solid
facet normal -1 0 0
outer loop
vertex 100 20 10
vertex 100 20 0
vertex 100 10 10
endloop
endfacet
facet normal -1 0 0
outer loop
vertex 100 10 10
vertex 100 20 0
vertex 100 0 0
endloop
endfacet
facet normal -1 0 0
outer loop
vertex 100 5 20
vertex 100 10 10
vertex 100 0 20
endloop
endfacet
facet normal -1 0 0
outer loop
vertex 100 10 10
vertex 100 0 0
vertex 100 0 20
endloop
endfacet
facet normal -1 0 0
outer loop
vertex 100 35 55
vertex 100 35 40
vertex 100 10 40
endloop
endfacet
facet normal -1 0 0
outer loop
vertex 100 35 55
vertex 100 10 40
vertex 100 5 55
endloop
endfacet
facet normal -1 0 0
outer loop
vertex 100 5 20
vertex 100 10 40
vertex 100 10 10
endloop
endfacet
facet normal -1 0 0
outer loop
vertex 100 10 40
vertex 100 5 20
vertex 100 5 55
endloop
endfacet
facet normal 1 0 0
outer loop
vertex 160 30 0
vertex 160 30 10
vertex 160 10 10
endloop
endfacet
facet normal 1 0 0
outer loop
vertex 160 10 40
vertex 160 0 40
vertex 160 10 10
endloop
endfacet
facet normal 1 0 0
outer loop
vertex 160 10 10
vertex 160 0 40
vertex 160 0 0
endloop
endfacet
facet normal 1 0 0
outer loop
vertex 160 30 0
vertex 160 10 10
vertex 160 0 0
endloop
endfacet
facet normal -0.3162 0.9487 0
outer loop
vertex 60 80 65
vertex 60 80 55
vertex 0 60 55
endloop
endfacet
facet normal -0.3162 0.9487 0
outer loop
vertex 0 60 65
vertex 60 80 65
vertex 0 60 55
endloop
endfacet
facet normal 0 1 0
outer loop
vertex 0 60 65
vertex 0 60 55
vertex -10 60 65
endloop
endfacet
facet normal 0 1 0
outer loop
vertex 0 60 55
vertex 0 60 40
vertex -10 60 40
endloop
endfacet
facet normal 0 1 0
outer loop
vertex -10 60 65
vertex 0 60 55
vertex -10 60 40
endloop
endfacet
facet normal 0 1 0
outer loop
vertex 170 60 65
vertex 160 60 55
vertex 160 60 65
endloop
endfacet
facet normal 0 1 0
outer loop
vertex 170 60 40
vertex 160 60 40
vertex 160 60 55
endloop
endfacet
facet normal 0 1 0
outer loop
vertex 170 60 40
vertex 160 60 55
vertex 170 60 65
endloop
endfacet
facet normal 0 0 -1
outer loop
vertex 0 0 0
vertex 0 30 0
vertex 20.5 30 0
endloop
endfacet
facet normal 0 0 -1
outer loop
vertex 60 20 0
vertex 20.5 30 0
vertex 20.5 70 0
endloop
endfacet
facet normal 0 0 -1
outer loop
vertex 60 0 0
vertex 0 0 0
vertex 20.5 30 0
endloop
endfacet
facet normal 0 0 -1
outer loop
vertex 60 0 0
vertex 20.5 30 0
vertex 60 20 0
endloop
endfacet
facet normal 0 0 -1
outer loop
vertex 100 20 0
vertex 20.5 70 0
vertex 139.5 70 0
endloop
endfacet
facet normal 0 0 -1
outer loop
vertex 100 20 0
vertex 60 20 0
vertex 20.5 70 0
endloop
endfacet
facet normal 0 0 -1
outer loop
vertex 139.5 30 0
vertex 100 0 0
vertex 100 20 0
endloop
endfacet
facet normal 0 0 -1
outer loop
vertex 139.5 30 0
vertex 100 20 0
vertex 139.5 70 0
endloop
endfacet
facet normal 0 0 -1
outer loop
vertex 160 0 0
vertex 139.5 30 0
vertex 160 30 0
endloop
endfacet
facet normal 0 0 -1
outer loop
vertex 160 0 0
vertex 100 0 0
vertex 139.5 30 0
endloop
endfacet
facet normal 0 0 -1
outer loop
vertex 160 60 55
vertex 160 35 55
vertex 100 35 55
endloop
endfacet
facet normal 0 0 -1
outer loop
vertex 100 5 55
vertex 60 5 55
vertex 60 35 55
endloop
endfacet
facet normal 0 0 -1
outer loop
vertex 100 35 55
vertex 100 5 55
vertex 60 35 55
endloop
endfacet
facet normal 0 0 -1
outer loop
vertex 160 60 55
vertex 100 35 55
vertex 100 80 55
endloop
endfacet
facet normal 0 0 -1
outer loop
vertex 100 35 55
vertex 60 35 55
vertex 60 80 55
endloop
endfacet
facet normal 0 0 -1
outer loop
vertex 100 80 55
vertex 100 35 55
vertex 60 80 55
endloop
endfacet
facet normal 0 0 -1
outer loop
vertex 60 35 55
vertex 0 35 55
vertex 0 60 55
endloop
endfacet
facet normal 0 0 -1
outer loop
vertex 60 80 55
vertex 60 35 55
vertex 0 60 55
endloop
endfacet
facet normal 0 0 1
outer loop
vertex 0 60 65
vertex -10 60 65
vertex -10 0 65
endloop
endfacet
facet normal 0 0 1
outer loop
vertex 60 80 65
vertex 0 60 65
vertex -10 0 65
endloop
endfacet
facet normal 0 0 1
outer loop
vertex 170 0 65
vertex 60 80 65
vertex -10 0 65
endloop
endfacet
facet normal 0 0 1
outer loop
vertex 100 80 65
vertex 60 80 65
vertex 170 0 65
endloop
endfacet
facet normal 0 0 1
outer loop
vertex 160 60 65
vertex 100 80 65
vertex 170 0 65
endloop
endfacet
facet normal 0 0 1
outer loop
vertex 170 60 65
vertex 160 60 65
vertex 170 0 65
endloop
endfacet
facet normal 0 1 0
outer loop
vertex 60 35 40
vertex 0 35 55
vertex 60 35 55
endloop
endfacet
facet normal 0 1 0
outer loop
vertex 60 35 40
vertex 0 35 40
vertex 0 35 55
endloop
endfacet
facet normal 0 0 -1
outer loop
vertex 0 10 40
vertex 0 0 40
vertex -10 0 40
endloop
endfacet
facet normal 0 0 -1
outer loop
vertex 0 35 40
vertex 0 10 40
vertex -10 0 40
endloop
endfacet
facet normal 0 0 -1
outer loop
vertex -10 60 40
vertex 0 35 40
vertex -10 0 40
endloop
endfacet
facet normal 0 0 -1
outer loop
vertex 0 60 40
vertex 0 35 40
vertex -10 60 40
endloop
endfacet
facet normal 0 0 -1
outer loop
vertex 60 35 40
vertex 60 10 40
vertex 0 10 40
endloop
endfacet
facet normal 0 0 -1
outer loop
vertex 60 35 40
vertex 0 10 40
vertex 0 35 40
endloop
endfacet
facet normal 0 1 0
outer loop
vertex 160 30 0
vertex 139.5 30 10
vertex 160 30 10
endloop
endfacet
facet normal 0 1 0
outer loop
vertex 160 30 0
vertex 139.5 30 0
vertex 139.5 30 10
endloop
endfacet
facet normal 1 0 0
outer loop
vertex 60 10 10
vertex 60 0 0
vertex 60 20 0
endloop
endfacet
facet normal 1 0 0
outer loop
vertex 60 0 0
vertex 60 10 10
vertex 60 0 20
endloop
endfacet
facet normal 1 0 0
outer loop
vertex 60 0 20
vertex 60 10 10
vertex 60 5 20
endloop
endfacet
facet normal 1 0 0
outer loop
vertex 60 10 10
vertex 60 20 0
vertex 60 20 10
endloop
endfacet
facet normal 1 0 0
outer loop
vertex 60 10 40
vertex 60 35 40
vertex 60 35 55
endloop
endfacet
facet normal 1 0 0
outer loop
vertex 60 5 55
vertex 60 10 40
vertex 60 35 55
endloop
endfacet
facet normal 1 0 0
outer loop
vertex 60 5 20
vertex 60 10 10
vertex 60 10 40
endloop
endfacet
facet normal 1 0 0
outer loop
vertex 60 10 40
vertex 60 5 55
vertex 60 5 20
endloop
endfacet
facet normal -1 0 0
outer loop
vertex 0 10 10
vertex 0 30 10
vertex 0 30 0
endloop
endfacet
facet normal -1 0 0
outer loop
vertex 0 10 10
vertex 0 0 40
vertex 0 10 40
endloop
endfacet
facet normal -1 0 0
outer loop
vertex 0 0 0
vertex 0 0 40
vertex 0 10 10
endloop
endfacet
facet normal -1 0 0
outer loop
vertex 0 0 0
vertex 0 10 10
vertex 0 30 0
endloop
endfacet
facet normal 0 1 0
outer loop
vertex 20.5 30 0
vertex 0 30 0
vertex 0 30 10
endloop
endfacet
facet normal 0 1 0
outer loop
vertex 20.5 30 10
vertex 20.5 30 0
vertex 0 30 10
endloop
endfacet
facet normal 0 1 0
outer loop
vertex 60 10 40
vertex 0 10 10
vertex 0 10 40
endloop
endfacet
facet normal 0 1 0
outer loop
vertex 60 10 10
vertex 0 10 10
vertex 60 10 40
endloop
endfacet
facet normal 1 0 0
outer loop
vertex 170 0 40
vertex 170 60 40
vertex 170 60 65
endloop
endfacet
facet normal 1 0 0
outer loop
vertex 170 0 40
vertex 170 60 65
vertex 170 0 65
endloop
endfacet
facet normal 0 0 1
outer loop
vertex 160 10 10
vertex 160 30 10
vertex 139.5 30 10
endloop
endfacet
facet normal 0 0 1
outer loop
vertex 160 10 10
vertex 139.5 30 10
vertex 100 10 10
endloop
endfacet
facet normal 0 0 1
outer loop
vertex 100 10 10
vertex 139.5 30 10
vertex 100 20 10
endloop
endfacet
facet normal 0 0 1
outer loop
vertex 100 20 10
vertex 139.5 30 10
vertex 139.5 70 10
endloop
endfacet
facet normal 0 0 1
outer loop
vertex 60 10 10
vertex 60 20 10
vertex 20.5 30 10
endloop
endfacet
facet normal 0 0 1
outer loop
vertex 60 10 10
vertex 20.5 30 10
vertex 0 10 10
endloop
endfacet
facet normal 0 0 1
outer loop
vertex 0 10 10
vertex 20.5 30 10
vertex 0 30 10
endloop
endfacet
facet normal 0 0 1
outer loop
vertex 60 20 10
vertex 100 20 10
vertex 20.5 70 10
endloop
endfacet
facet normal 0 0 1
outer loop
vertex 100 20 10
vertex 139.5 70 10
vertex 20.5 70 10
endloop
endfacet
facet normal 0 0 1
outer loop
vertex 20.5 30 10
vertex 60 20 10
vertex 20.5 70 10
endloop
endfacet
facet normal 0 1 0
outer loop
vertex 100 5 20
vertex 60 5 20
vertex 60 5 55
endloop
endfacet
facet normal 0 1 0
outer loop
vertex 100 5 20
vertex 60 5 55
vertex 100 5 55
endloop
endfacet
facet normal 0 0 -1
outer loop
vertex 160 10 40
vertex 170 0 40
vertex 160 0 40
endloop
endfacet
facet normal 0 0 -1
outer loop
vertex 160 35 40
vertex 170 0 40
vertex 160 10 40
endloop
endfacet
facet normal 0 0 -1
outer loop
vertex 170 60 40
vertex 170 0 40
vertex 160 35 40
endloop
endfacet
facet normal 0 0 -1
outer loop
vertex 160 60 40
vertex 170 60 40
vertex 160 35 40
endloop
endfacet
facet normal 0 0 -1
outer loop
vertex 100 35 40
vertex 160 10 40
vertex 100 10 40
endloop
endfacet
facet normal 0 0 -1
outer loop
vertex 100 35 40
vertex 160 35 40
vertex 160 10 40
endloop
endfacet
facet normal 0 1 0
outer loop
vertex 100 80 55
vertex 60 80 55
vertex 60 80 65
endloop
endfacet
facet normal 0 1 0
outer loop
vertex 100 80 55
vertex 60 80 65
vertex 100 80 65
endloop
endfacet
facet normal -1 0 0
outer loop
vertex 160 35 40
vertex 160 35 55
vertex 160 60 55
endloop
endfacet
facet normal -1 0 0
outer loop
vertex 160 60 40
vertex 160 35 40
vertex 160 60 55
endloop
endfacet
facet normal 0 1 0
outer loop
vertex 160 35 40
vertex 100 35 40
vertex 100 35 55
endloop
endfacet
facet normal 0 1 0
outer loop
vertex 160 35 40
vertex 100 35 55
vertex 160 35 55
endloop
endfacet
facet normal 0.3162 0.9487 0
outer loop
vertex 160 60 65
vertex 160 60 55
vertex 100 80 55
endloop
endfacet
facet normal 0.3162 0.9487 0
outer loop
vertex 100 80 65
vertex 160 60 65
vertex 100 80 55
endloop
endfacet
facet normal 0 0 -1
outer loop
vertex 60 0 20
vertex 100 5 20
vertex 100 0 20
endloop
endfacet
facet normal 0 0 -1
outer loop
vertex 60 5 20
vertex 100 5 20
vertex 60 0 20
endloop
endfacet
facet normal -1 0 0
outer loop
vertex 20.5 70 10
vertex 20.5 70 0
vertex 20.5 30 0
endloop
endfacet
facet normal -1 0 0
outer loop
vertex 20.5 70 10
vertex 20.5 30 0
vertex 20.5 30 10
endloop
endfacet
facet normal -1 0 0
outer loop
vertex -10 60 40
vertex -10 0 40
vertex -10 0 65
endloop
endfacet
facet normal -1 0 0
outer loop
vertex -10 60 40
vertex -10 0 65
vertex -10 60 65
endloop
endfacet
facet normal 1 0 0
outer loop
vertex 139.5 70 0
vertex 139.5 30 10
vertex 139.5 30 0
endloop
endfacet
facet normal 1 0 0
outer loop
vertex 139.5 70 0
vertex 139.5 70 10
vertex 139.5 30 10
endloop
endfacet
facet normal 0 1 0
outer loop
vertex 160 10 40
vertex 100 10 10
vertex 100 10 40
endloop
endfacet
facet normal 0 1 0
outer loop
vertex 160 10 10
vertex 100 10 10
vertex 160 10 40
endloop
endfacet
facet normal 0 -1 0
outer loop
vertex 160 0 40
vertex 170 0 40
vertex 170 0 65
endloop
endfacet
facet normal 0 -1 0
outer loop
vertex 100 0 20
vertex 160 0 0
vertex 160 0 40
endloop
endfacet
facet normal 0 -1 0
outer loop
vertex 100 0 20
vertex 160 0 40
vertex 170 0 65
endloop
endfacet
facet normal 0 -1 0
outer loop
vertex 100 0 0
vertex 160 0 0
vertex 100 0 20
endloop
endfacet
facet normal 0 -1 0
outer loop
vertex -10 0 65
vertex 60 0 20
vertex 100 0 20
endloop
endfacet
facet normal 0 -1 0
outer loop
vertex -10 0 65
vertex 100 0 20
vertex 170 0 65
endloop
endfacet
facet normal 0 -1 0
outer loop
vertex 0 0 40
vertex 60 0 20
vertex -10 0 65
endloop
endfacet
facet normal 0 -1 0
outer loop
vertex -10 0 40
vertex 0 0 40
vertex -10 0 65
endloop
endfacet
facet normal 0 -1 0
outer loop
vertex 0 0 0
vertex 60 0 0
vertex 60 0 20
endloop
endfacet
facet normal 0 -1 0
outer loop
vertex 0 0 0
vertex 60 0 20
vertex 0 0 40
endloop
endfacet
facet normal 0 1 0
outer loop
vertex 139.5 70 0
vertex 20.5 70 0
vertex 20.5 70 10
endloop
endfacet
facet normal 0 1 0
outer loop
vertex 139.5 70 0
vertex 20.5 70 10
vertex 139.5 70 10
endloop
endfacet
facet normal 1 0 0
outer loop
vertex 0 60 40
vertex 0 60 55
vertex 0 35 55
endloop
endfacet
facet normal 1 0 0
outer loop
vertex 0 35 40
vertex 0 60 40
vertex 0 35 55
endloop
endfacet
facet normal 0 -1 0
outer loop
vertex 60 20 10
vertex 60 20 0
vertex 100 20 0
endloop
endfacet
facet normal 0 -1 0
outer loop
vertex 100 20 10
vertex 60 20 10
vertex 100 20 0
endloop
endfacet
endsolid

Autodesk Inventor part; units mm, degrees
ref_plane "YZ Plane" through (0, 0, 0) normal (1, 0, 0) x (0, 1, 0)
ref_plane "XZ Plane" through (0, 0, 0) normal (0, 1, 0) x (-1, 0, 0)
ref_plane "XY Plane" through (0, 0, 0) normal (0, 0, 1) x (1, 0, 0)
sketch "Sketch1" plane through (0, 0, 0) normal (0, 1, 0) x (-1, 0, 0)
  line L0 (0, 0) -> (-160, 0)
  line L1 (-160, 0) -> (-160, 60)
  line L2 (-160, 60) -> (0, 60)
  line L3 (0, 60) -> (0, 0)
  dimension "d0" = 160
  dimension "d1" = 60
extrude "Extrusion1" add sketch "Sketch1" along normal blind 80
sketch "Sketch2" plane through (0, 80, 0) normal (0, 1, 0) x (1, 0, 0)
  line L0 (160, 0) -> (0, 0) projected
  line L1 (160, 0) -> (150, 0)
  line L2 (150, 0) -> (150, -10)
  line L3 (150, -10) -> (160, -10)
  line L4 (160, -10) -> (160, 0)
  line L5 (160, -10) -> (0, -10)
  line L6 (0, -10) -> (0, -40)
  line L7 (0, -40) -> (160, -40)
  line L8 (160, -40) -> (160, -10)
  dimension "d4" = 10
  dimension "d5" = 10
  dimension "d6" = 160
  dimension "d7" = 30
extrude "Extrusion2" cut sketch "Sketch2" against normal blind 70 contours L8 L7 L6 L5 L3
sketch "Sketch3" plane through (0, 80, 0) normal (0, 1, 0) x (1, 0, 0)
  line L0 (160, -40) -> (0, -40) projected
  line L1 (0, -40) -> (160, -40)
  line L2 (160, -40) -> (160, -50)
  line L3 (160, -50) -> (0, -50)
  line L4 (0, -50) -> (0, -40)
  point P0 (0, 0)
  dimension "d10" = 160
  dimension "d11" = 10
extrude "Extrusion3" cut sketch "Sketch3" against normal blind 10
sketch "Sketch4" plane through (160, 10, 40) normal (0, 0, -1) x (-1, 0, 0)
  line L0 (0, 0) -> (160, 0) projected
  arc A0 (160, 0) -> (0, 0) centre (80, -23.3333) ccw
  line L1 (0, 0) -> (0, 60) projected
  line L2 (0, 0) -> (0, 60)
  line L3 (0, 60) -> (80, 60)
  line L4 (160, 60) -> (0, 60) projected
  line L5 (160, 60) -> (160, 0) projected
  line L6 (160, 0) -> (160, 60)
  line L7 (160, 60) -> (80, 60)
  point P0 (160, -10)
extrude "Extrusion4" cut sketch "Sketch4" against normal blind 10 contours L1 L3 A0 | A0 L4 L5
sketch "Sketch5" plane through (160, 0, 0) normal (0, 0, -1) x (-1, 0, 0)
  line L0 (0, 80) -> (160, 80) projected
  line L1 (0, 80) -> (20, 80)
  line L2 (20, 80) -> (20, 30)
  line L3 (20, 30) -> (0, 30)
  line L4 (0, 30) -> (0, 80)
  line L5 (160, 10) -> (160, 80) projected
  line L6 (160, 80) -> (140, 80)
  line L7 (140, 80) -> (140, 30)
  line L8 (140, 30) -> (160, 30)
  line L9 (160, 30) -> (160, 80)
  point P0 (160, 0)
  dimension "d16" = 20
  dimension "d17" = 50
  dimension "d18" = 20
  dimension "d19" = 50
extrude "Extrusion5" cut sketch "Sketch5" against normal blind 10
sketch "Sketch6" plane through (0, 80, 0) normal (0, 1, 0) x (1, 0, 0)
  line L0 (20, 0) -> (20, -10) projected
  line L1 (20, -10) -> (140, -10)
  line L2 (140, -10) -> (140, 0)
  line L3 (140, 0) -> (20, 0)
  line L4 (20, 0) -> (20, -10)
  point P0 (0, 0)
  dimension "d22" = 120
  dimension "d23" = 10
extrude "Extrusion6" cut sketch "Sketch6" against normal blind 10
sketch "Sketch7" plane through (160, 80, 50) normal (0, 0, -1) x (-1, 0, 0)
  line L0 (0, 0) -> (0, -20)
  line L1 (0, -70) -> (0, 0) projected
  line L2 (0, -20) -> (0, 0)
  line L3 (160, 0) -> (0, 0) projected
  line L4 (0, 0) -> (60, 0)
  line L5 (60, 0) -> (0, -20)
  line L6 (0, 0) -> (160, 0) projected
  line L7 (160, 0) -> (160, -20)
  line L8 (160, 0) -> (160, -70) projected
  line L9 (160, 0) -> (100, 0)
  line L10 (100, 0) -> (160, -20)
  point P0 (160, -80)
  dimension "d26" = 20
  dimension "d27" = 60
  dimension "d28" = 20
  dimension "d29" = 60
extrude "Extrusion7" cut sketch "Sketch7" against normal blind 10
sketch "Sketch8" plane through (140, 30, 10) normal (1, 0, 0) x (0, 0, -1)
  line L0 (10, 40) -> (0, 40) projected
  line L1 (10, 0) -> (10, 40) projected
  line L2 (0, 40) -> (10, 40)
  line L3 (10, 40) -> (10, 0)
  line L4 (10, 0) -> (0, 0)
  line L5 (0, 0) -> (0, 40)
  point P0 (10, -30)
extrude "Extrusion8" cut sketch "Sketch8" against normal blind 0.5
sketch "Sketch9" plane through (20, 30, 0) normal (-1, 0, 0) x (0, 0, 1)
  line L0 (10, 40) -> (10, 0) projected
  line L1 (0, 0) -> (10, 0) projected
  line L2 (10, 40) -> (0, 40)
  line L3 (0, 40) -> (0, 0)
  line L4 (0, 0) -> (10, 0)
  line L5 (10, 0) -> (10, 40)
  point P0 (0, -30)
extrude "Extrusion9" cut sketch "Sketch9" against normal blind 0.5
sketch "Sketch11" plane through (80, -13.3333, 40) normal (0, 0, -1) x (-1, 0, 0)
  line L0 (-80, 23.3333) -> (-80, 73.3333) projected
  arc A0 (80, 23.3333) -> (-80, 23.3333) centre (0, 0) ccw
  line L1 (-80, 23.3333) -> (80, 23.3333) projected
  line L2 (-80, 23.3333) -> (80, 23.3333)
  point P0 (80, 13.3333)
extrude "Extrusion10" cut sketch "Sketch11" against normal blind 10
sketch "Sketch12" plane through (160, 10, 50) normal (0, 0, -1) x (-1, 0, 0)
  line L0 (60, 70) -> (0, 50) projected
  line L1 (0, 0) -> (0, 50) projected
  line L2 (160, 0) -> (0, 0) projected
  line L3 (160, 50) -> (160, 0) projected
  line L4 (160, 50) -> (100, 70) projected
  line L5 (60, 70) -> (100, 70) projected
  point P0 (160, -10)
extrude "Extrusion11" cut sketch "Sketch12" against normal blind 5
sketch "Sketch13" plane through (0, 10, 0) normal (0, 1, 0) x (1, 0, 0)
  line L0 (0, -55) -> (160, -55)
  line L1 (160, -55) -> (160, -40)
  line L2 (160, -40) -> (0, -40)
  line L3 (0, -40) -> (0, -55)
  point P0 (0, 0)
  dimension "d40" = 160
  dimension "d41" = 15
extrude "Extrusion12" add sketch "Sketch13" along normal blind 20
sketch "Sketch14" plane through (0, 30, 0) normal (0, 1, 0) x (1, 0, 0)
  line L0 (0, -40) -> (160, -40) projected
  line L1 (160, -40) -> (100, -40)
  line L2 (100, -40) -> (100, -55)
  line L3 (100, -55) -> (160, -55)
  line L4 (160, -55) -> (160, -40)
  line L5 (0, -40) -> (0, -55) projected
  line L6 (60, -55) -> (0, -55) projected
  line L7 (0, -40) -> (60, -40)
  line L8 (60, -40) -> (60, -55)
  line L9 (60, -55) -> (0, -55)
  line L10 (0, -55) -> (0, -40)
  line L11 (100, -40) -> (60, -40)
  line L12 (60, -40) -> (60, -55)
  line L13 (60, -55) -> (100, -55)
  line L14 (100, -55) -> (100, -40)
  point P0 (0, 0)
  dimension "d44" = 60
  dimension "d45" = 15
  dimension "d46" = 60
  dimension "d47" = 15
extrude "Extrusion13" cut sketch "Sketch14" against normal blind 20 contours L0 L2 L13 L8
sketch "Sketch15" plane through (0, 0, 0) normal (-1, 0, 0) x (0, 0, 1)
  line L0 (40, 30) -> (55, 30) projected
  line L1 (60, 0) -> (0, 0) projected
  line L2 (40, 30) -> (60, 30)
  line L3 (60, 30) -> (60, 0)
  line L4 (60, 0) -> (40, 0)
  line L5 (40, 0) -> (40, 30)
  line L6 (55, 80) -> (55, 60) projected
  line L7 (55, 60) -> (60, 60)
  line L8 (60, 60) -> (60, 30)
  line L9 (60, 30) -> (55, 30)
  line L10 (55, 30) -> (55, 60)
extrude "Extrusion14" add sketch "Sketch15" along normal blind 10
sketch "Sketch16" plane through (160, 0, 60) normal (1, 0, 0) x (0, 0, -1)
  line L0 (5, 30) -> (5, 60) projected
  line L1 (0, 0) -> (0, 60) projected
  line L2 (5, 60) -> (0, 60)
  line L3 (0, 60) -> (0, 0)
  line L4 (0, 0) -> (5, 0)
  line L5 (5, 0) -> (5, 60)
  point P0 (60, 0)
extrude "Extrusion15" add sketch "Sketch16" along normal blind 10
sketch "Sketch17" plane through (-10, 0, 0) normal (-1, 0, 0) x (0, 0, 1)
  line L0 (55, 30) -> (40, 30) projected
  line L1 (55, 0) -> (55, 60) projected
  line L2 (40, 30) -> (55, 30)
  line L3 (55, 30) -> (55, 0)
  line L4 (55, 0) -> (40, 0)
  line L5 (40, 0) -> (40, 30)
  point P0 (0, 0)
extrude "Extrusion16" cut sketch "Sketch17" against normal blind 10
sketch "Sketch18" plane through (60, 80, 60) normal (0, 0, 1) x (1, 0, 0)
  line L0 (100, -20) -> (40, 0) projected
  line L1 (0, 0) -> (40, 0) projected
  line L2 (0, 0) -> (-60, -20) projected
  line L3 (-60, -20) -> (-70, -20) projected
  line L4 (-70, -80) -> (-70, -20) projected
  line L5 (110, -80) -> (-70, -80) projected
  line L6 (110, -20) -> (110, -80) projected
  line L7 (100, -20) -> (110, -20) projected
  point P0 (-60, -80)
extrude "Extrusion17" add sketch "Sketch18" along normal blind 5
sketch "Sketch19" plane through (160, 0, 0) normal (0, 0, -1) x (-1, 0, 0)
  line L0 (0, 0) -> (60, 0)
  line L1 (160, 0) -> (0, 0) projected
  line L2 (60, 0) -> (100, 0)
  line L3 (100, 0) -> (100, 20)
  line L4 (100, 20) -> (60, 20)
  line L5 (60, 20) -> (60, 0)
  dimension "d58" = 60
  dimension "d59" = 40
  dimension "d60" = 20
extrude "Extrusion18" cut sketch "Sketch19" against normal blind 20
sketch "Sketch20" plane through (0, 10, 0) normal (0, 1, 0) x (1, 0, 0)
  line L0 (60, 0) -> (60, -20) projected
  line L1 (100, -40) -> (100, -55) projected
  line L2 (60, -20) -> (100, -20)
  line L3 (100, -20) -> (100, -55)
  line L4 (100, -55) -> (60, -55)
  line L5 (60, -55) -> (60, -20)
  point P0 (0, 0)
extrude "Extrusion19" cut sketch "Sketch20" against normal blind 5
sketch "Sketch21" plane through (0, 30, 0) normal (0, 1, 0) x (1, 0, 0)
  line L0 (0, -55) -> (0, 0) projected
  line L1 (0, -55) -> (60, -55)
  line L2 (60, -55) -> (60, -40)
  line L3 (60, -40) -> (0, -40)
  line L4 (0, -40) -> (0, -55)
  line L5 (100, -40) -> (100, -55) projected
  line L6 (160, -55) -> (100, -55) projected
  line L7 (100, -40) -> (160, -40)
  line L8 (160, -40) -> (160, -55)
  line L9 (160, -55) -> (100, -55)
  line L10 (100, -55) -> (100, -40)
extrude "Extrusion20" add sketch "Sketch21" along normal blind 10
sketch "Sketch22" plane through (160, 10, 55) normal (0, 0, -1) x (-1, 0, 0)
  line L0 (0, 50) -> (60, 70) projected
  line L1 (0, -10) -> (-10, -10) projected
  line L2 (0, 50) -> (-10, 50)
  line L3 (-10, 50) -> (-10, -10)
  line L4 (-10, -10) -> (0, -10)
  line L5 (0, -10) -> (0, 50)
  line L6 (160, 50) -> (170, 50) projected
  line L7 (160, -10) -> (170, -10)
  line L8 (170, -10) -> (170, 50)
  line L9 (170, 50) -> (160, 50)
  line L10 (160, 50) -> (160, -10)
extrude "Extrusion21" add sketch "Sketch22" along normal blind 15
sketch "Sketch23" plane through (0, 40, 0) normal (0, 1, 0) x (1, 0, 0)
  line L0 (160, -55) -> (160, -40) projected
  line L1 (100, -40) -> (160, -40) projected
  line L2 (160, -55) -> (100, -55)
  line L3 (100, -55) -> (100, -40)
  line L4 (100, -40) -> (160, -40)
  line L5 (160, -40) -> (160, -55)
  line L6 (0, -40) -> (60, -40) projected
  line L7 (60, -55) -> (0, -55) projected
  line L8 (60, -40) -> (0, -40)
  line L9 (0, -40) -> (0, -55)
  line L10 (0, -55) -> (60, -55)
  line L11 (60, -55) -> (60, -40)
  point P0 (0, 0)
extrude "Extrusion22" cut sketch "Sketch23" against normal blind 5
properties part number "NewLaptopSupport"
